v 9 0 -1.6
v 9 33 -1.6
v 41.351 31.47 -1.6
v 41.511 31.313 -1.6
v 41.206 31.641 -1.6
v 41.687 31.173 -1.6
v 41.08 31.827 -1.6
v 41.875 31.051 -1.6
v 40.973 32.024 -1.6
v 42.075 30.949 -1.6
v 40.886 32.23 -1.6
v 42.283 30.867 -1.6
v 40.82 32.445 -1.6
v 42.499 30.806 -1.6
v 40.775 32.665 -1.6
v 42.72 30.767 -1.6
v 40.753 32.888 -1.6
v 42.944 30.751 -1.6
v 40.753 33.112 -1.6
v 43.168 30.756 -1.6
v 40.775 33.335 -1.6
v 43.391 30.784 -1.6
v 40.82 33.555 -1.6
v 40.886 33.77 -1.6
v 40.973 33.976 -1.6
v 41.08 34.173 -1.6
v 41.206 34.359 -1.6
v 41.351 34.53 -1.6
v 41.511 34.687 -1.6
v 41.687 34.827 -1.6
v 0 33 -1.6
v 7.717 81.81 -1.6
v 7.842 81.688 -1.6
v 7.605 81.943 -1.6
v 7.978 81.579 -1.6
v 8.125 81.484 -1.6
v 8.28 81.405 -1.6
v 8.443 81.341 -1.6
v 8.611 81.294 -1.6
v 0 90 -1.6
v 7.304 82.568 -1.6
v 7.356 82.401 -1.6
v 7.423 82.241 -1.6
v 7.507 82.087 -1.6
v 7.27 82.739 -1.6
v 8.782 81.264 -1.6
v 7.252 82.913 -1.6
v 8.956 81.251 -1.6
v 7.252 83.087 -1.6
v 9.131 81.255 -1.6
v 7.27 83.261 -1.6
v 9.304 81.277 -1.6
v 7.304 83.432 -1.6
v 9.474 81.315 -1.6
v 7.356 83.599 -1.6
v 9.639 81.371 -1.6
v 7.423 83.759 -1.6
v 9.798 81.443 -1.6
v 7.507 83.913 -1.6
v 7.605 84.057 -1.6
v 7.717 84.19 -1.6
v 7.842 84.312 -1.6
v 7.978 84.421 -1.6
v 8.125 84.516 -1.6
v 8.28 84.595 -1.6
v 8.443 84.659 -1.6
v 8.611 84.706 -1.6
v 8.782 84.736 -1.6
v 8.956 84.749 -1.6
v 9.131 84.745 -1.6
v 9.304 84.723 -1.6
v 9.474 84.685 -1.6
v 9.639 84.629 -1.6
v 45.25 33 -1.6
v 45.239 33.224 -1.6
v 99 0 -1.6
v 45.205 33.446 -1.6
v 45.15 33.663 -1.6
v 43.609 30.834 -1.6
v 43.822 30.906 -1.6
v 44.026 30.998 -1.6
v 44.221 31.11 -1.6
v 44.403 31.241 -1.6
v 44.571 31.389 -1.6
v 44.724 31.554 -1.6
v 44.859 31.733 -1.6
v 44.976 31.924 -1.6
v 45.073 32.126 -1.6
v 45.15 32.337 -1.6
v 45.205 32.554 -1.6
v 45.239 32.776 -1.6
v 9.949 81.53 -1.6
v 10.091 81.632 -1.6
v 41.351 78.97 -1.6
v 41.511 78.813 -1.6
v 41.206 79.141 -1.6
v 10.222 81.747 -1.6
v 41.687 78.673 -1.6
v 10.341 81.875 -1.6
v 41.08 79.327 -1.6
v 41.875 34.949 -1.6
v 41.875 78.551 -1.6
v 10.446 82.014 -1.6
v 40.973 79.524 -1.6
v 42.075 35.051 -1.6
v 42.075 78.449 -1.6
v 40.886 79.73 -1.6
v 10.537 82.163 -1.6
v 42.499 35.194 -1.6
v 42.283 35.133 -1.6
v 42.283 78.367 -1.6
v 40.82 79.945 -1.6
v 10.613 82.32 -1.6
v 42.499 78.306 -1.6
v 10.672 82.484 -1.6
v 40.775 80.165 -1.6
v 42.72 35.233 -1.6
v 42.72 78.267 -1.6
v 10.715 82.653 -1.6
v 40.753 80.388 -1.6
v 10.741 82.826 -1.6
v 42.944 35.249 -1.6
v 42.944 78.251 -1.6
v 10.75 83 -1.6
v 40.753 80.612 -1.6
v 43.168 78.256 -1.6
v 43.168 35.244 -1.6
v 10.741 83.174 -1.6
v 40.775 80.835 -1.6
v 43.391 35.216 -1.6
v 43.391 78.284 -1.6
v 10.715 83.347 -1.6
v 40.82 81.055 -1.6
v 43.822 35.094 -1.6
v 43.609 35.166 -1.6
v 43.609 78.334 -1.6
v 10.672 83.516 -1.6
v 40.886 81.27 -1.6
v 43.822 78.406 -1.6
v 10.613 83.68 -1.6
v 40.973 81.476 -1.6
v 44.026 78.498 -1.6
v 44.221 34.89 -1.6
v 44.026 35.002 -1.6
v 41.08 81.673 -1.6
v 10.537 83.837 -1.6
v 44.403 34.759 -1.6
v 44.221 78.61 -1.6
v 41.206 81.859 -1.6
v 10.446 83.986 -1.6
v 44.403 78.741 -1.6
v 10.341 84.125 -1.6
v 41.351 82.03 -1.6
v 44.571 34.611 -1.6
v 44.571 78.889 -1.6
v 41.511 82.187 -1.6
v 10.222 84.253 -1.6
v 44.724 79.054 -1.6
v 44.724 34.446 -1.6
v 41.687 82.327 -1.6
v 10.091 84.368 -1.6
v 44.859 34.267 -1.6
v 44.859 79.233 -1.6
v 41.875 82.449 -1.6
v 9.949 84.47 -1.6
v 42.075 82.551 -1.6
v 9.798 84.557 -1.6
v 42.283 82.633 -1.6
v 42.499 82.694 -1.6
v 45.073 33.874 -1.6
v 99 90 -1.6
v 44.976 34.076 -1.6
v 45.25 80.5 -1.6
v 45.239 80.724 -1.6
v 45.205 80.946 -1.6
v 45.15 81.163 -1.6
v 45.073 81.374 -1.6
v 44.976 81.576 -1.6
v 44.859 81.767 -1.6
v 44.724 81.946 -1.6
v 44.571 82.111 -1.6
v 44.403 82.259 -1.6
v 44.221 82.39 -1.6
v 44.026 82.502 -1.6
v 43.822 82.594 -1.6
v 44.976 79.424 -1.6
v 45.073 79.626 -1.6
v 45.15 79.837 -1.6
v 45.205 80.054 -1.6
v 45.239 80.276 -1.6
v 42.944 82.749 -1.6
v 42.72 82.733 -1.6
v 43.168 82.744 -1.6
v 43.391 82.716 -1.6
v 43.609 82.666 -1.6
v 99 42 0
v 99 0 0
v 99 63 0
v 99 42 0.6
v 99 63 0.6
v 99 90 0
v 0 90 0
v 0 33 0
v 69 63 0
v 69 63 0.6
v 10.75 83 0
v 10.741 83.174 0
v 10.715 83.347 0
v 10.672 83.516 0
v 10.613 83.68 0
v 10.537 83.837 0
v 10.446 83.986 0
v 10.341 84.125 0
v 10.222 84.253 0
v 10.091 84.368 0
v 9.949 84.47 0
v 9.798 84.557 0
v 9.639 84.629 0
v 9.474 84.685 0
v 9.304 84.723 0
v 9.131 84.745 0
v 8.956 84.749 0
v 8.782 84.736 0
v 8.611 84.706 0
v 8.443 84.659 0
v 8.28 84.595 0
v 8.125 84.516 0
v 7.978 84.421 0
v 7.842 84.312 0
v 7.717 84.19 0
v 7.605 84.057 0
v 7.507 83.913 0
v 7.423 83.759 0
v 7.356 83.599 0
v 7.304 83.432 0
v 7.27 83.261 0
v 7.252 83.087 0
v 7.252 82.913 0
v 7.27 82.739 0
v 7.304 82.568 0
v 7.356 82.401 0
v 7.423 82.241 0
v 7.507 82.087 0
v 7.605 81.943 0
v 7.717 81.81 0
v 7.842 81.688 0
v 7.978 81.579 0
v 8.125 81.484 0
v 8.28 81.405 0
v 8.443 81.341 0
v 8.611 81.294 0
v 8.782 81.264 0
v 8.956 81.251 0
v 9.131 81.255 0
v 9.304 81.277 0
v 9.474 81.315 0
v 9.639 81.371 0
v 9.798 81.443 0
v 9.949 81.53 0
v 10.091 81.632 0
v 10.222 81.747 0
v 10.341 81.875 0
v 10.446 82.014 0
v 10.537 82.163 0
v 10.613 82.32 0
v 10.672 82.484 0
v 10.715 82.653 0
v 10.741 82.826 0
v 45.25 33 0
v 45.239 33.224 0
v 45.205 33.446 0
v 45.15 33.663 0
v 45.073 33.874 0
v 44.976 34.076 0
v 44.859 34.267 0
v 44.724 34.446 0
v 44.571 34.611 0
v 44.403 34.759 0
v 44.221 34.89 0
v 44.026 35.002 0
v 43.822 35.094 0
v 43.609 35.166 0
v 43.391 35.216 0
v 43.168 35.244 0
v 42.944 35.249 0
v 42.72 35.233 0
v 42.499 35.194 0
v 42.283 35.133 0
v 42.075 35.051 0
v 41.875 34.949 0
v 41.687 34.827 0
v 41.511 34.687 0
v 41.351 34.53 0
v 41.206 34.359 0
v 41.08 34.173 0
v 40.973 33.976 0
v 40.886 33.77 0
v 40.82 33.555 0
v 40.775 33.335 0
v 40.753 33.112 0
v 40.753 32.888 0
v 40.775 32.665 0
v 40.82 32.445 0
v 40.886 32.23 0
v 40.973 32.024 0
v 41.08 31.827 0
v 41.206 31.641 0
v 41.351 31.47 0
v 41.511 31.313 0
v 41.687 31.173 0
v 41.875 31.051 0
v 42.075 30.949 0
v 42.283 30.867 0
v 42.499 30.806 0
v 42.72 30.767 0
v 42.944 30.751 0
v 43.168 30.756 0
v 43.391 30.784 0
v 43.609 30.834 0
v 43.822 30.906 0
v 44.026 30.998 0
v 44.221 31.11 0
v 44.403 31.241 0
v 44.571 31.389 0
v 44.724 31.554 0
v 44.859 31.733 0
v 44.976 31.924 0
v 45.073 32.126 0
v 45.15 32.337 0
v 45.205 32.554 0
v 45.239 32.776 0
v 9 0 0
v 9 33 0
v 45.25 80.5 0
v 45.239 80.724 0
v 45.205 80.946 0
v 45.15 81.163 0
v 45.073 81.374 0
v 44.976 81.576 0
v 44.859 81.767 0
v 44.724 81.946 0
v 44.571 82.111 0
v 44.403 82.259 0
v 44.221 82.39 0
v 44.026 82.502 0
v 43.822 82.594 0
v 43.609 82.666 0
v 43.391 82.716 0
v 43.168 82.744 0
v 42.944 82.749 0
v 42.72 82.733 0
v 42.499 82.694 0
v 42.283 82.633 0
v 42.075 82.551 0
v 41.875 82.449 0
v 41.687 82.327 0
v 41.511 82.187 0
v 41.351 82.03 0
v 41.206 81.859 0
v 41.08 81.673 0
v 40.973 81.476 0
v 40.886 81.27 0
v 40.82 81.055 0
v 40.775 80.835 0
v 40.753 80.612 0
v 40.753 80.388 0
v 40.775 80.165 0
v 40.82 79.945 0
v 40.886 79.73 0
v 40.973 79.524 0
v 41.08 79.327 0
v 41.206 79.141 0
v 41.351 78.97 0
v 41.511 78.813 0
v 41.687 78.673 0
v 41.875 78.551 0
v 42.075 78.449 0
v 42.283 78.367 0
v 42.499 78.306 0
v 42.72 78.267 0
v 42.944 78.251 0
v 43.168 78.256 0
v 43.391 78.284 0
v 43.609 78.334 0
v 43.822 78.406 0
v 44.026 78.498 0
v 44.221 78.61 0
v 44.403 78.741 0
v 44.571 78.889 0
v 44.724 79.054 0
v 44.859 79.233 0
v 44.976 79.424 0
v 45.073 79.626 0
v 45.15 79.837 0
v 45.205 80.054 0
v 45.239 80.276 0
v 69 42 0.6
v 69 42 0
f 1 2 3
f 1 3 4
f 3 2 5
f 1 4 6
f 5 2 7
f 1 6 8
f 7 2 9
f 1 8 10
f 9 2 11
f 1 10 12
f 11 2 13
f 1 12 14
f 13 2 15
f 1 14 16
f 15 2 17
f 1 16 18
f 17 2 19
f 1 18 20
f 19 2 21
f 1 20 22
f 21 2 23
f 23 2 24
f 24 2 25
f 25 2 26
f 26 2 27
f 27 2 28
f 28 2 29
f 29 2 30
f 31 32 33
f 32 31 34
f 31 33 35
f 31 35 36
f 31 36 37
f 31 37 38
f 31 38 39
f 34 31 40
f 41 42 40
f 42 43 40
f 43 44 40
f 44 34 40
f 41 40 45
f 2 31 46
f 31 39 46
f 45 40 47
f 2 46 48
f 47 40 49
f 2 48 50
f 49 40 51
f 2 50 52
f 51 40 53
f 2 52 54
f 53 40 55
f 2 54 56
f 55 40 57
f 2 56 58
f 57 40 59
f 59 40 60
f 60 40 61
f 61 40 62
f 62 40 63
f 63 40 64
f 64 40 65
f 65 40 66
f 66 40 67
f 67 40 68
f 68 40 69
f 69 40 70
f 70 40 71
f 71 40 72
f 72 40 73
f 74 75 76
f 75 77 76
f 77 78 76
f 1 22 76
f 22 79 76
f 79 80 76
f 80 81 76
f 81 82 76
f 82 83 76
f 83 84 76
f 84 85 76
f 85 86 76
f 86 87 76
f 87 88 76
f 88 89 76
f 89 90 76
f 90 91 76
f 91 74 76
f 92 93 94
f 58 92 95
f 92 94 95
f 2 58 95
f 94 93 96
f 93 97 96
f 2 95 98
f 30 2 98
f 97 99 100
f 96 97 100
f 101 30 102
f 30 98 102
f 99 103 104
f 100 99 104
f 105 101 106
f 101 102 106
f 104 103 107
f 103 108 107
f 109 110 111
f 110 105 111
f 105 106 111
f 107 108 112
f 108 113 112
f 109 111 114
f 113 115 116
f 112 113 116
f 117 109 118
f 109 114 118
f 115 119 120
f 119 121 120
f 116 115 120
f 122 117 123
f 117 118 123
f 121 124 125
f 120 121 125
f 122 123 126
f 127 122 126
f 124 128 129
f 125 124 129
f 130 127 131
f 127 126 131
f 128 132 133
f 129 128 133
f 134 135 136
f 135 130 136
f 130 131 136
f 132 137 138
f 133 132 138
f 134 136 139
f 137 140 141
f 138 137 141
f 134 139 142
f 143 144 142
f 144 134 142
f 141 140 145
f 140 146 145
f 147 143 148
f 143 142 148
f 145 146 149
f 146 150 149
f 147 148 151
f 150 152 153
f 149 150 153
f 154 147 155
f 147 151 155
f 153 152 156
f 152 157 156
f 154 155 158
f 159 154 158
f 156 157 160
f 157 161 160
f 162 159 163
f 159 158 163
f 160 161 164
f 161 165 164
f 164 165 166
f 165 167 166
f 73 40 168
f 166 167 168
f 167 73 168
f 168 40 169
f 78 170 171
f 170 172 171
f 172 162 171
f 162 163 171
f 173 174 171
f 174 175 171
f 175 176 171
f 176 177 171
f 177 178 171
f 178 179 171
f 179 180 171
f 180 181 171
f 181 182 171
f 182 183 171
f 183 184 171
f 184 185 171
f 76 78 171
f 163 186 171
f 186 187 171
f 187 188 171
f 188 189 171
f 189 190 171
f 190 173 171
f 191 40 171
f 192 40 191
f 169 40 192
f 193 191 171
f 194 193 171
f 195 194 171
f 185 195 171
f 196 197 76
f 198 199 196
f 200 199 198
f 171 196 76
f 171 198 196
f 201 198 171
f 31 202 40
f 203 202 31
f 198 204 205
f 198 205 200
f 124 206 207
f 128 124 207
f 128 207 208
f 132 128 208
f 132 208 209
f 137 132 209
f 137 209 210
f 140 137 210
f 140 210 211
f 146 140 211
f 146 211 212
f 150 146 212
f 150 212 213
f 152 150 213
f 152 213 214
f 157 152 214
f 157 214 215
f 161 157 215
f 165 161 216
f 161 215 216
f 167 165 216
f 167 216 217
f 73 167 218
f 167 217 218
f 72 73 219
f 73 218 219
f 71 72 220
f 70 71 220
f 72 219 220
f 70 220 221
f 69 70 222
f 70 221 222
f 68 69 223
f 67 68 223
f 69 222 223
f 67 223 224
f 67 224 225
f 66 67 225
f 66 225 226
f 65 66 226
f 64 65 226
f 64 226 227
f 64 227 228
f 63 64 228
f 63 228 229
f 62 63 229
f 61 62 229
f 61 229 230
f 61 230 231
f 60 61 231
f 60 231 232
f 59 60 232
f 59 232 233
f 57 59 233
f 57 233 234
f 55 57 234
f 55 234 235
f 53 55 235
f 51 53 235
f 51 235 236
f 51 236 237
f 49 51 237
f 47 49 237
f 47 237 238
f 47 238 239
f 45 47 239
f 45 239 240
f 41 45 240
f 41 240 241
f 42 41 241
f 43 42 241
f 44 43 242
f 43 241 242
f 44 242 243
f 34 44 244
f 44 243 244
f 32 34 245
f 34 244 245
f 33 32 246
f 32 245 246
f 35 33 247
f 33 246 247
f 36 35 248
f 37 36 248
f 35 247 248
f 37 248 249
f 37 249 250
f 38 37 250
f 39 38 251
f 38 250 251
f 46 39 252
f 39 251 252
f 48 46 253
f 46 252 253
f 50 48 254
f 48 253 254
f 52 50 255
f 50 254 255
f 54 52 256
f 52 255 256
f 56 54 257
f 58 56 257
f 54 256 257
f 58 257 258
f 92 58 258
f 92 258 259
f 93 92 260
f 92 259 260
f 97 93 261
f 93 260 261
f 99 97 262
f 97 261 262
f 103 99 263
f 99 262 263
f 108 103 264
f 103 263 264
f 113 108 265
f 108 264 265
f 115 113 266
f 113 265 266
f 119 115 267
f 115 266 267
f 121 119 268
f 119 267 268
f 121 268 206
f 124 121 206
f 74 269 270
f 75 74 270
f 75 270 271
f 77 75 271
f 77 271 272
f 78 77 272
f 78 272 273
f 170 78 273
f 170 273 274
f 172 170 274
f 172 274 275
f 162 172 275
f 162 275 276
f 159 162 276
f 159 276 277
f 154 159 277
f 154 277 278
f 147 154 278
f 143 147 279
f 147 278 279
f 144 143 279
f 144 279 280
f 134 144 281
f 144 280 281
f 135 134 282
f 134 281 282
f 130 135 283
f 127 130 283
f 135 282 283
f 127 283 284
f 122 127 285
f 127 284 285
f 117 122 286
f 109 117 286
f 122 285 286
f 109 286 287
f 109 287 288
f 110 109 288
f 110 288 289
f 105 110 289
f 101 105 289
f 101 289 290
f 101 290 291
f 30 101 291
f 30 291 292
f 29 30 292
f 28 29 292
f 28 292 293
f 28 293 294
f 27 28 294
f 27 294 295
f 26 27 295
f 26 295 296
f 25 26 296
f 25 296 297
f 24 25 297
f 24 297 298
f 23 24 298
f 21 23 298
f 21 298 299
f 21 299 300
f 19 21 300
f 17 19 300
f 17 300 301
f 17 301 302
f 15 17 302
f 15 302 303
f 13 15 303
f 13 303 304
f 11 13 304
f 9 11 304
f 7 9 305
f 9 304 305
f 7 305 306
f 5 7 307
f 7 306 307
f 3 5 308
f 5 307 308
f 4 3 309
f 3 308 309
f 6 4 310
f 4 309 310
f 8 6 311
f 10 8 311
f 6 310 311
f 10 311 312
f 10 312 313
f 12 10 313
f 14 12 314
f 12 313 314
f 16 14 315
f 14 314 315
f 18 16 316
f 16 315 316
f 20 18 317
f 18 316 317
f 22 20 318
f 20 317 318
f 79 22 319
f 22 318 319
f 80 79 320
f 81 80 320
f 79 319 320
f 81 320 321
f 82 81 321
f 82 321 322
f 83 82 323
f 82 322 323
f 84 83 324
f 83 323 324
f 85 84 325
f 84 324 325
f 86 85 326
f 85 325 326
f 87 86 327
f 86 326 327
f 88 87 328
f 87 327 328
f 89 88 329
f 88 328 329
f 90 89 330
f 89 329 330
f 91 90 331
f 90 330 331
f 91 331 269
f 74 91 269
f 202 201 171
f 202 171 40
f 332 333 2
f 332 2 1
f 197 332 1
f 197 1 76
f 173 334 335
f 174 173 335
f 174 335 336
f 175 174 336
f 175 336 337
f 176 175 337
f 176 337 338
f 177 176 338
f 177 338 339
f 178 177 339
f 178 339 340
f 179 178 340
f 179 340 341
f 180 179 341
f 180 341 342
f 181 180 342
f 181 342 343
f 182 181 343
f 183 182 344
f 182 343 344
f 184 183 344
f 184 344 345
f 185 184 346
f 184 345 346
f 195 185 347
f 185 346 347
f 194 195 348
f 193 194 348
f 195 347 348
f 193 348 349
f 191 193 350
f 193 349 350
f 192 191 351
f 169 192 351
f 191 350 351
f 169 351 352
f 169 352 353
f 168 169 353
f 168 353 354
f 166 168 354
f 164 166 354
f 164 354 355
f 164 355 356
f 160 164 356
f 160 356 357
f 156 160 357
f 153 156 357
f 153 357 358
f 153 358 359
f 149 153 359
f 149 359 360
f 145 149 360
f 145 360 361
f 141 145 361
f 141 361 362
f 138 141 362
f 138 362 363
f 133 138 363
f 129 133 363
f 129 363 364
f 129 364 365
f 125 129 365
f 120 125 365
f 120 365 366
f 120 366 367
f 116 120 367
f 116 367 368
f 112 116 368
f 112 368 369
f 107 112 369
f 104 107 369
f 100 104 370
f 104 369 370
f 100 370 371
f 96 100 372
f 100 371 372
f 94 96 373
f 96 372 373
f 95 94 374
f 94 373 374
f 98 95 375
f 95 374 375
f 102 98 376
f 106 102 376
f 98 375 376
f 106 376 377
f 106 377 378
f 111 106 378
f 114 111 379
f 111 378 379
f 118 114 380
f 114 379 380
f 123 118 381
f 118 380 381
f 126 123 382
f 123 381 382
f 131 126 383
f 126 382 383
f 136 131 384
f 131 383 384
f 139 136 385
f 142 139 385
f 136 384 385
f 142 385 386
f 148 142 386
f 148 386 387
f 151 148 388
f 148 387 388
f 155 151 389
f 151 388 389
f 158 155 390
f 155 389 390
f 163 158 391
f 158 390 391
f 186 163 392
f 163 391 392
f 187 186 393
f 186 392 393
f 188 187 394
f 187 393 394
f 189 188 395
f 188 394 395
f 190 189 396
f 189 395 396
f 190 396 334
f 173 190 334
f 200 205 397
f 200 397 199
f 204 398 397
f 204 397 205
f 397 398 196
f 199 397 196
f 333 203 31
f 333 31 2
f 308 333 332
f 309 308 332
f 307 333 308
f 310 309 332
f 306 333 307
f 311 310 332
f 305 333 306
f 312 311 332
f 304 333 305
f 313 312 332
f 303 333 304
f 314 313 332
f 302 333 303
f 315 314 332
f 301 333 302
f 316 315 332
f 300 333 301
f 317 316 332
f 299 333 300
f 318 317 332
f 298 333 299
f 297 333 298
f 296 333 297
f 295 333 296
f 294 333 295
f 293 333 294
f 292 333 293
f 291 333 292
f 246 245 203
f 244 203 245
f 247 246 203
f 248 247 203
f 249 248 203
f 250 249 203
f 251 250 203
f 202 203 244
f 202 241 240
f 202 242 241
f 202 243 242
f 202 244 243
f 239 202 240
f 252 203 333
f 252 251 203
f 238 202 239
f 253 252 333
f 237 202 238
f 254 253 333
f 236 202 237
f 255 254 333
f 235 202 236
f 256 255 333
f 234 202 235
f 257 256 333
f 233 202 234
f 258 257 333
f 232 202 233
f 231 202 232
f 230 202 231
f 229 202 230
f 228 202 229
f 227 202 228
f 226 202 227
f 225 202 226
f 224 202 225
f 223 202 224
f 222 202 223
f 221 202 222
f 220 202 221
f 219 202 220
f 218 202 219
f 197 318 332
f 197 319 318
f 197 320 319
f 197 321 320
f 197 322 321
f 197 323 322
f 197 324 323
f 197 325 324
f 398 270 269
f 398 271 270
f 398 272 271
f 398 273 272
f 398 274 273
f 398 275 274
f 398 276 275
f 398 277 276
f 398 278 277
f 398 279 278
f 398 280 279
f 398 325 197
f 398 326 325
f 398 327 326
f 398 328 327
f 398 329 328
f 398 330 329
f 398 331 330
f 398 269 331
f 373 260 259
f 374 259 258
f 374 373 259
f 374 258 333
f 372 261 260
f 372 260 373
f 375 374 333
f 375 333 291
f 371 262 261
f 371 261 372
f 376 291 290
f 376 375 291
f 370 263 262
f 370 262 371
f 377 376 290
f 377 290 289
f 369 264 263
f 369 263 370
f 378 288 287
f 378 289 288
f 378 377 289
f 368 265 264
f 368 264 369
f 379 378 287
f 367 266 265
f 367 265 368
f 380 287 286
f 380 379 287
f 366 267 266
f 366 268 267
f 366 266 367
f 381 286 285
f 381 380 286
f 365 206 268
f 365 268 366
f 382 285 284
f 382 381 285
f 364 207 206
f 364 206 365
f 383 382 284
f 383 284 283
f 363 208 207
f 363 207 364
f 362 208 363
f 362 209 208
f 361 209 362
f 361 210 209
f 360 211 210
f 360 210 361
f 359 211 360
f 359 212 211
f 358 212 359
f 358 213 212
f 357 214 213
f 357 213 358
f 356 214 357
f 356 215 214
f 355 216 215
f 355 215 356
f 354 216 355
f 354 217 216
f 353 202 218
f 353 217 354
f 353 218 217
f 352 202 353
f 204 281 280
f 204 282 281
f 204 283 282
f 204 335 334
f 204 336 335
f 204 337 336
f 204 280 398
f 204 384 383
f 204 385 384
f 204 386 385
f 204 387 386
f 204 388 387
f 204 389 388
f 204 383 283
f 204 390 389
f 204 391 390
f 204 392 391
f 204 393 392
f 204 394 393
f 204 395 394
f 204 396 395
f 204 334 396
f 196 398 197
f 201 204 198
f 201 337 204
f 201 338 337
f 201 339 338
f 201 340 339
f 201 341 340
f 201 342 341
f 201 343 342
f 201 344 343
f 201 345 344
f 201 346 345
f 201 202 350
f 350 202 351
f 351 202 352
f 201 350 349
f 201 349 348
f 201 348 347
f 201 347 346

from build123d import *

# Parameters (mm, degrees)
BOARDBASE_DEPTH      = 1.6
SKETCH2_R            = 1.75
SKETCH2_R_2          = 2.25
EXISTING_HOLES_DEPTH = 2.6
SKETCH3_W            = 30
SKETCH3_H            = 21
FREE_AREA_DEPTH      = 0.6


with BuildPart() as part:
    # Sketch1 → BoardBase (new body)
    with BuildSketch(Plane.XY):
        Polygon((9, 0), (99, 0), (99, 90), (0, 90), (0, 33), (9, 33), align=None)
    extrude(amount=-BOARDBASE_DEPTH)

    # Sketch2 → Existing Holes (cut, through all)
    with BuildSketch(Plane.XY):
        with Locations((9, 83)):
            Circle(SKETCH2_R)
        with Locations((43, 80.5)):
            Circle(SKETCH2_R_2)
        with Locations((43, 33)):
            Circle(SKETCH2_R_2)
    extrude(amount=-EXISTING_HOLES_DEPTH, mode=Mode.SUBTRACT)

    # Sketch3 → 'Free' area (add)
    with BuildSketch(Plane.XY):
        with Locations((84, 52.5)):
            Rectangle(SKETCH3_W, SKETCH3_H)
    extrude(amount=FREE_AREA_DEPTH)


solid = part.part
